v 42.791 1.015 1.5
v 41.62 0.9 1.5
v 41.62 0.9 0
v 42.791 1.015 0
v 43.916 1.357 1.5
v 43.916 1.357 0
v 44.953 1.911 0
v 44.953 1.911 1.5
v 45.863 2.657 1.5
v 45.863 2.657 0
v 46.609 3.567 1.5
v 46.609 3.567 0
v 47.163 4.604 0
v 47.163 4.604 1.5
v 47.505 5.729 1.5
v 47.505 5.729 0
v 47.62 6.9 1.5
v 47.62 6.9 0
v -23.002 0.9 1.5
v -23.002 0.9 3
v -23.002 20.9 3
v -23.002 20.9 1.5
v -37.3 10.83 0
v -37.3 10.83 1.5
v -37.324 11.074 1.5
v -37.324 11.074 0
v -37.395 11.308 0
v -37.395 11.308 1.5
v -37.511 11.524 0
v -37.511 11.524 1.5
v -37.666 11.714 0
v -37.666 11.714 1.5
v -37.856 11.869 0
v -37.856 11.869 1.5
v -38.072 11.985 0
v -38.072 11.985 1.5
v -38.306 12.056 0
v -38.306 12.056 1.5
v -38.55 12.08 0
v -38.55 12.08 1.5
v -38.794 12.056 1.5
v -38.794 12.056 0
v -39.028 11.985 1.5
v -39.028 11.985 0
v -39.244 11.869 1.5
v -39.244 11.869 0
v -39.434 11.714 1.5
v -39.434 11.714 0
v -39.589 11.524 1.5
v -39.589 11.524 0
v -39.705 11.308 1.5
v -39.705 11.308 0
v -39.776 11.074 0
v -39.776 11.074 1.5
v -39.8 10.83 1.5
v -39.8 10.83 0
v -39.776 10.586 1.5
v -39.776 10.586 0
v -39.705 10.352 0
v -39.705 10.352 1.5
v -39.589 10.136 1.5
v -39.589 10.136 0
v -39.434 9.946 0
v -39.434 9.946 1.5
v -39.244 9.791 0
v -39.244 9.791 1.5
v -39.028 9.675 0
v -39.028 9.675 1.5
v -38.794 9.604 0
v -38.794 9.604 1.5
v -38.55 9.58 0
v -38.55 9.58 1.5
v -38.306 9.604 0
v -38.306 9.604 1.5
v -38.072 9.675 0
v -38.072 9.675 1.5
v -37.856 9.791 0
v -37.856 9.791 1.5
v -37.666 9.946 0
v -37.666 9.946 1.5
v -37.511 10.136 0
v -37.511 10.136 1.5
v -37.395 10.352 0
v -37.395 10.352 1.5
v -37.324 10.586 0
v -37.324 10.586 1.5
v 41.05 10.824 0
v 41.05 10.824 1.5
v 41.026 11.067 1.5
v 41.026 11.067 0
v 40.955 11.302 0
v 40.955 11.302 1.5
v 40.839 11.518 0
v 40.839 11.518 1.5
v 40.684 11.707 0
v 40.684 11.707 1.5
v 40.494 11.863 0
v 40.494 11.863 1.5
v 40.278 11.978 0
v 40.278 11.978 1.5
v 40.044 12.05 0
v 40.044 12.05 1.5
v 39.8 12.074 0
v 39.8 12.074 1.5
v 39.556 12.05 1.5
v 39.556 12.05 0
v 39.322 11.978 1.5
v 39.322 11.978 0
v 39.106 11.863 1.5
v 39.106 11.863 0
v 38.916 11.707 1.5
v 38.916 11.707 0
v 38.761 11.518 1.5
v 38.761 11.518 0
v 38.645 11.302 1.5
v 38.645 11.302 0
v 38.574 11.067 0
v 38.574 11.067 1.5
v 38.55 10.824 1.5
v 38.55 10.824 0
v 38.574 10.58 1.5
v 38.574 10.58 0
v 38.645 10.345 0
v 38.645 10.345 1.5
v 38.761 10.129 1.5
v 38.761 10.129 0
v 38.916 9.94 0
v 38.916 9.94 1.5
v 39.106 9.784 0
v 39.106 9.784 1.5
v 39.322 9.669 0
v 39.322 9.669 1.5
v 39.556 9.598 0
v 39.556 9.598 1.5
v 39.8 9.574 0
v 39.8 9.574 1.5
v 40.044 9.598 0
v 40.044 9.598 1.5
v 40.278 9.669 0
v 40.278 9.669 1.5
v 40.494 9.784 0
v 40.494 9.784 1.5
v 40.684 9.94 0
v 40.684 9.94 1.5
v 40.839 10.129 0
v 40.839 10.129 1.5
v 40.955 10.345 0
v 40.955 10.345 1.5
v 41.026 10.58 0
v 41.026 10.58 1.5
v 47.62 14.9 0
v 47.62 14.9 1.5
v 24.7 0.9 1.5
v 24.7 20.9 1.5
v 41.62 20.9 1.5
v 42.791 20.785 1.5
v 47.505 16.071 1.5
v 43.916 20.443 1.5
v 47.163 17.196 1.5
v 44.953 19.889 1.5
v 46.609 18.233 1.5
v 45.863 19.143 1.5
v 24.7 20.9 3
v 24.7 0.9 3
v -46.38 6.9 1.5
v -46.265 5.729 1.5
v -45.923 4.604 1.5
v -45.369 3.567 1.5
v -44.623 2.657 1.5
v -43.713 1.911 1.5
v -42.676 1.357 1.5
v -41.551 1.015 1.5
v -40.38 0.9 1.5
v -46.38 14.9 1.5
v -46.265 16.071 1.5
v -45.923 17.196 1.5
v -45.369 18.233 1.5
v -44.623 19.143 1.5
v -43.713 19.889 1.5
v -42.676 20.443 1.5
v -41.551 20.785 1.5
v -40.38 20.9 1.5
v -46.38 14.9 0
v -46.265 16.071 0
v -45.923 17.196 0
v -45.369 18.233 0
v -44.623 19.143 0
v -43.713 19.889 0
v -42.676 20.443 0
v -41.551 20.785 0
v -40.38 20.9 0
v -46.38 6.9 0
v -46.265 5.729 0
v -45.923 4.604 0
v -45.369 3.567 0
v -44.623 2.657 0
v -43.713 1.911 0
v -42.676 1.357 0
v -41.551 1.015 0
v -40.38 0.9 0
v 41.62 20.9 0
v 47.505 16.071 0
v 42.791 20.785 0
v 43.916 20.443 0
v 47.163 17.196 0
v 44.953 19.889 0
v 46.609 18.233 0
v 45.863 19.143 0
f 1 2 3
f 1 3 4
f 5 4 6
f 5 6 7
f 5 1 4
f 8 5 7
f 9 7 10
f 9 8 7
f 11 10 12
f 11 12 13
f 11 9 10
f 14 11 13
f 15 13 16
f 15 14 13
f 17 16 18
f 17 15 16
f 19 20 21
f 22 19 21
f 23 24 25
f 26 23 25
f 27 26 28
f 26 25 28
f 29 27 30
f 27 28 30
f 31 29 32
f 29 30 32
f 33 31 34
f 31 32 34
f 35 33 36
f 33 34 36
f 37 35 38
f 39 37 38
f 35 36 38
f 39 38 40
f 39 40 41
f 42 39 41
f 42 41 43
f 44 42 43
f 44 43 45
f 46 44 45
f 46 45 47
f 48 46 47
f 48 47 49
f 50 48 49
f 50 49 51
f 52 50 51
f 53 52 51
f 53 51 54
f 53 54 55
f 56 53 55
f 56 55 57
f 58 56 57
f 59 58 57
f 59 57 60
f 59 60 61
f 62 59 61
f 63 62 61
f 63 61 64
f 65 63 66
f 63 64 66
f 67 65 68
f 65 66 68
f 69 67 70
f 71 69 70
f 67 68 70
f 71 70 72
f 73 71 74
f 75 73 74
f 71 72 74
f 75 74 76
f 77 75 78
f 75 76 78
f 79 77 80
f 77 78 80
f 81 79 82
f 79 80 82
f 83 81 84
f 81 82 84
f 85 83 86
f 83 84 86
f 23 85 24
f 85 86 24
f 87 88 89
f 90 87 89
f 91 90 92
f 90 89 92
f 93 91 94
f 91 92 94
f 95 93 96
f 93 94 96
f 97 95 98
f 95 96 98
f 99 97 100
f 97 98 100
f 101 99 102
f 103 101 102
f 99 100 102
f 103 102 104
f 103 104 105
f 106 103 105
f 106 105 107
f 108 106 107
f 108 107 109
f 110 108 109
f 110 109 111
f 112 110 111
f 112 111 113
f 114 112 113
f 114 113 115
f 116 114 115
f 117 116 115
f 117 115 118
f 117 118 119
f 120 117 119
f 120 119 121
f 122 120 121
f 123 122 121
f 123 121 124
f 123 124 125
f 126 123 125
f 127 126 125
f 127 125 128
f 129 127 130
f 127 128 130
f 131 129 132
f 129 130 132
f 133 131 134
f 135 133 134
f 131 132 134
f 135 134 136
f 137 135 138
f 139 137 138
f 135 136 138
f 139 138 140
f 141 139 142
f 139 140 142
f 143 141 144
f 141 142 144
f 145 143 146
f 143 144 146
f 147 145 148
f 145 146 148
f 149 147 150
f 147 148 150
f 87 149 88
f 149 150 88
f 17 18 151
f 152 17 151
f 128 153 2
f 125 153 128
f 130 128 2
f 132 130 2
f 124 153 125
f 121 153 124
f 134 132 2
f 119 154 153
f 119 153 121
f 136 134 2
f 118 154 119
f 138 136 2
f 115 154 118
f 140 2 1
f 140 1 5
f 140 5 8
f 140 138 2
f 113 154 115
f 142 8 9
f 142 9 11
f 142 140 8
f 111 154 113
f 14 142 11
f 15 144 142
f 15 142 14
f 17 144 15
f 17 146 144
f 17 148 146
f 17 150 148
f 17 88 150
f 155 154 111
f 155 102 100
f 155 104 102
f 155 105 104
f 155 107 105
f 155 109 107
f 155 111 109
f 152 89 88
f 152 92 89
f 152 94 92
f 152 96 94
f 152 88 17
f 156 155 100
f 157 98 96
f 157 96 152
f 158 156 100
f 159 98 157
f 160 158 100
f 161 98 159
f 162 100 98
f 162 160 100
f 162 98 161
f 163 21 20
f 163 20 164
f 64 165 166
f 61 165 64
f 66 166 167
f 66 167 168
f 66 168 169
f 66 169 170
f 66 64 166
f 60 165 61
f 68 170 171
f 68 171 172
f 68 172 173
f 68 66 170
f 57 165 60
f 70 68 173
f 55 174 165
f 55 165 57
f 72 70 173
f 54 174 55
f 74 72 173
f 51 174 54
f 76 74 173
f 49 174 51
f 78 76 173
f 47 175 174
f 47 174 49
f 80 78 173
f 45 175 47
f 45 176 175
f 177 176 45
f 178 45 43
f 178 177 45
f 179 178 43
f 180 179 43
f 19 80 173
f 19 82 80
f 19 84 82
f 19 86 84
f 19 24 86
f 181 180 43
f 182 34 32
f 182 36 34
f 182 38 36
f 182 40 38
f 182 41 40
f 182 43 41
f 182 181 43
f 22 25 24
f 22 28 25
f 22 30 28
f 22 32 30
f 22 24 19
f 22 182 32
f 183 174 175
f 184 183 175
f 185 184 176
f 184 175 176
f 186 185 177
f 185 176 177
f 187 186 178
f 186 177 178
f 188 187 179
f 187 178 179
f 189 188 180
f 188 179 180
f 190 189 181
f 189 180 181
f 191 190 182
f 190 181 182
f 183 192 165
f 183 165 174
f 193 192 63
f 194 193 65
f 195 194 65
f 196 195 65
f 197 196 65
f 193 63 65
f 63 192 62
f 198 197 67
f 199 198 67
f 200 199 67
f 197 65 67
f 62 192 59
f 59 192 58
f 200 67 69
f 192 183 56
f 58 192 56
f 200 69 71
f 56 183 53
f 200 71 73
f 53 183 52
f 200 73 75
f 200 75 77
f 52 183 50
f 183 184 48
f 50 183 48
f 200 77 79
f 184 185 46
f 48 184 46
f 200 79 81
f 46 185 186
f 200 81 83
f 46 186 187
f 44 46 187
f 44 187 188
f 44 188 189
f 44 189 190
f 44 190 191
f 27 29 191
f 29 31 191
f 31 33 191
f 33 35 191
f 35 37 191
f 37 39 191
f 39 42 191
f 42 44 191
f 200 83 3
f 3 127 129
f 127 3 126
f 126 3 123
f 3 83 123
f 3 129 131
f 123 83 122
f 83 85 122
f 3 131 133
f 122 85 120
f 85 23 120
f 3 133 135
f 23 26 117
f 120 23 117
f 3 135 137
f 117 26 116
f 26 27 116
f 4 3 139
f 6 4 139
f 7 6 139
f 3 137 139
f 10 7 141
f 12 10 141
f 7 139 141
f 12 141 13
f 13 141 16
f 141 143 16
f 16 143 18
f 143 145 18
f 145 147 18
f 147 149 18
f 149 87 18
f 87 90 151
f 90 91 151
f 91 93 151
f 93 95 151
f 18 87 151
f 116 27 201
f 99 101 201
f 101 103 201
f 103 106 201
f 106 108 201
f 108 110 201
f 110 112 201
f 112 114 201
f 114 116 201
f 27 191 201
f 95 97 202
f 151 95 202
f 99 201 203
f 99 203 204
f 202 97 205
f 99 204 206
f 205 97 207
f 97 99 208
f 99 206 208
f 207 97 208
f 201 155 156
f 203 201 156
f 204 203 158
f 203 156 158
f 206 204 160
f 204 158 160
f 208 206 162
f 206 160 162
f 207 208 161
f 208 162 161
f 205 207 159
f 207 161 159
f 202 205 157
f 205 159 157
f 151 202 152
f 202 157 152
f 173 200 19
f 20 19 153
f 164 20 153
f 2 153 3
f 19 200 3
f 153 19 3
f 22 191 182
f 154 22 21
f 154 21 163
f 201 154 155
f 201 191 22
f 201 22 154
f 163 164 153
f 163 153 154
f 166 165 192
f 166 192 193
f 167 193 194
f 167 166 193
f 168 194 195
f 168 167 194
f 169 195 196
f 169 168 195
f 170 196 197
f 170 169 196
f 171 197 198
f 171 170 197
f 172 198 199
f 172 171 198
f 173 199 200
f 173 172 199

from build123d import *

# Parameters (mm, degrees)
SKETCH_W        = 94
SKETCH_H        = 20
EXTRUDE_DEPTH   = 3
SKETCH001_R     = 1.25
HOLE_DEPTH      = 3
FILLET_R        = 6
SKETCH002_W     = 23.4
SKETCH002_H     = 21
POCKET_DEPTH    = 1.5
SKETCH003_W     = 23.4
SKETCH003_H     = 21
POCKET001_DEPTH = 1.5


with BuildPart() as part:
    # Sketch → Extrude (new body)
    with BuildSketch(Plane.XY):
        with Locations((0.620003, 10.899999)):
            Rectangle(SKETCH_W, SKETCH_H)
    extrude(amount=EXTRUDE_DEPTH)

    # Sketch001 (on Face6 of BaseFeature) → Hole (cut)
    with BuildSketch(Plane.XY.offset(3)):
        with Locations((-38.549999, 10.83)):
            Circle(SKETCH001_R)
        with Locations((39.800001, 10.823599)):
            Circle(SKETCH001_R)
    extrude(amount=-HOLE_DEPTH, mode=Mode.SUBTRACT)

    # Fillet
    fillet_edges = [part.edges().sort_by_distance(p)[0] for p in [
        (-46.379997, 0.899999, 1.5),
        (-46.379997, 20.899999, 1.5),
        (47.620003, 20.899999, 1.5),
        (47.620003, 0.899999, 1.5),
    ]]
    fillet(fillet_edges, radius=FILLET_R)

    # Sketch002 (on Face5 of Fillet) → Pocket (cut)
    with BuildSketch(Plane.XY.offset(3)):
        with Locations((-34.701599, 10.700001)):
            Rectangle(SKETCH002_W, SKETCH002_H)
    extrude(amount=-POCKET_DEPTH, mode=Mode.SUBTRACT)

    # Sketch003 (on Face4 of Pocket) → Pocket001 (cut)
    with BuildSketch(Plane.XY.offset(3)):
        with Locations((36.4, 10.699637)):
            Rectangle(SKETCH003_W, SKETCH003_H)
    extrude(amount=-POCKET001_DEPTH, mode=Mode.SUBTRACT)


solid = part.part
